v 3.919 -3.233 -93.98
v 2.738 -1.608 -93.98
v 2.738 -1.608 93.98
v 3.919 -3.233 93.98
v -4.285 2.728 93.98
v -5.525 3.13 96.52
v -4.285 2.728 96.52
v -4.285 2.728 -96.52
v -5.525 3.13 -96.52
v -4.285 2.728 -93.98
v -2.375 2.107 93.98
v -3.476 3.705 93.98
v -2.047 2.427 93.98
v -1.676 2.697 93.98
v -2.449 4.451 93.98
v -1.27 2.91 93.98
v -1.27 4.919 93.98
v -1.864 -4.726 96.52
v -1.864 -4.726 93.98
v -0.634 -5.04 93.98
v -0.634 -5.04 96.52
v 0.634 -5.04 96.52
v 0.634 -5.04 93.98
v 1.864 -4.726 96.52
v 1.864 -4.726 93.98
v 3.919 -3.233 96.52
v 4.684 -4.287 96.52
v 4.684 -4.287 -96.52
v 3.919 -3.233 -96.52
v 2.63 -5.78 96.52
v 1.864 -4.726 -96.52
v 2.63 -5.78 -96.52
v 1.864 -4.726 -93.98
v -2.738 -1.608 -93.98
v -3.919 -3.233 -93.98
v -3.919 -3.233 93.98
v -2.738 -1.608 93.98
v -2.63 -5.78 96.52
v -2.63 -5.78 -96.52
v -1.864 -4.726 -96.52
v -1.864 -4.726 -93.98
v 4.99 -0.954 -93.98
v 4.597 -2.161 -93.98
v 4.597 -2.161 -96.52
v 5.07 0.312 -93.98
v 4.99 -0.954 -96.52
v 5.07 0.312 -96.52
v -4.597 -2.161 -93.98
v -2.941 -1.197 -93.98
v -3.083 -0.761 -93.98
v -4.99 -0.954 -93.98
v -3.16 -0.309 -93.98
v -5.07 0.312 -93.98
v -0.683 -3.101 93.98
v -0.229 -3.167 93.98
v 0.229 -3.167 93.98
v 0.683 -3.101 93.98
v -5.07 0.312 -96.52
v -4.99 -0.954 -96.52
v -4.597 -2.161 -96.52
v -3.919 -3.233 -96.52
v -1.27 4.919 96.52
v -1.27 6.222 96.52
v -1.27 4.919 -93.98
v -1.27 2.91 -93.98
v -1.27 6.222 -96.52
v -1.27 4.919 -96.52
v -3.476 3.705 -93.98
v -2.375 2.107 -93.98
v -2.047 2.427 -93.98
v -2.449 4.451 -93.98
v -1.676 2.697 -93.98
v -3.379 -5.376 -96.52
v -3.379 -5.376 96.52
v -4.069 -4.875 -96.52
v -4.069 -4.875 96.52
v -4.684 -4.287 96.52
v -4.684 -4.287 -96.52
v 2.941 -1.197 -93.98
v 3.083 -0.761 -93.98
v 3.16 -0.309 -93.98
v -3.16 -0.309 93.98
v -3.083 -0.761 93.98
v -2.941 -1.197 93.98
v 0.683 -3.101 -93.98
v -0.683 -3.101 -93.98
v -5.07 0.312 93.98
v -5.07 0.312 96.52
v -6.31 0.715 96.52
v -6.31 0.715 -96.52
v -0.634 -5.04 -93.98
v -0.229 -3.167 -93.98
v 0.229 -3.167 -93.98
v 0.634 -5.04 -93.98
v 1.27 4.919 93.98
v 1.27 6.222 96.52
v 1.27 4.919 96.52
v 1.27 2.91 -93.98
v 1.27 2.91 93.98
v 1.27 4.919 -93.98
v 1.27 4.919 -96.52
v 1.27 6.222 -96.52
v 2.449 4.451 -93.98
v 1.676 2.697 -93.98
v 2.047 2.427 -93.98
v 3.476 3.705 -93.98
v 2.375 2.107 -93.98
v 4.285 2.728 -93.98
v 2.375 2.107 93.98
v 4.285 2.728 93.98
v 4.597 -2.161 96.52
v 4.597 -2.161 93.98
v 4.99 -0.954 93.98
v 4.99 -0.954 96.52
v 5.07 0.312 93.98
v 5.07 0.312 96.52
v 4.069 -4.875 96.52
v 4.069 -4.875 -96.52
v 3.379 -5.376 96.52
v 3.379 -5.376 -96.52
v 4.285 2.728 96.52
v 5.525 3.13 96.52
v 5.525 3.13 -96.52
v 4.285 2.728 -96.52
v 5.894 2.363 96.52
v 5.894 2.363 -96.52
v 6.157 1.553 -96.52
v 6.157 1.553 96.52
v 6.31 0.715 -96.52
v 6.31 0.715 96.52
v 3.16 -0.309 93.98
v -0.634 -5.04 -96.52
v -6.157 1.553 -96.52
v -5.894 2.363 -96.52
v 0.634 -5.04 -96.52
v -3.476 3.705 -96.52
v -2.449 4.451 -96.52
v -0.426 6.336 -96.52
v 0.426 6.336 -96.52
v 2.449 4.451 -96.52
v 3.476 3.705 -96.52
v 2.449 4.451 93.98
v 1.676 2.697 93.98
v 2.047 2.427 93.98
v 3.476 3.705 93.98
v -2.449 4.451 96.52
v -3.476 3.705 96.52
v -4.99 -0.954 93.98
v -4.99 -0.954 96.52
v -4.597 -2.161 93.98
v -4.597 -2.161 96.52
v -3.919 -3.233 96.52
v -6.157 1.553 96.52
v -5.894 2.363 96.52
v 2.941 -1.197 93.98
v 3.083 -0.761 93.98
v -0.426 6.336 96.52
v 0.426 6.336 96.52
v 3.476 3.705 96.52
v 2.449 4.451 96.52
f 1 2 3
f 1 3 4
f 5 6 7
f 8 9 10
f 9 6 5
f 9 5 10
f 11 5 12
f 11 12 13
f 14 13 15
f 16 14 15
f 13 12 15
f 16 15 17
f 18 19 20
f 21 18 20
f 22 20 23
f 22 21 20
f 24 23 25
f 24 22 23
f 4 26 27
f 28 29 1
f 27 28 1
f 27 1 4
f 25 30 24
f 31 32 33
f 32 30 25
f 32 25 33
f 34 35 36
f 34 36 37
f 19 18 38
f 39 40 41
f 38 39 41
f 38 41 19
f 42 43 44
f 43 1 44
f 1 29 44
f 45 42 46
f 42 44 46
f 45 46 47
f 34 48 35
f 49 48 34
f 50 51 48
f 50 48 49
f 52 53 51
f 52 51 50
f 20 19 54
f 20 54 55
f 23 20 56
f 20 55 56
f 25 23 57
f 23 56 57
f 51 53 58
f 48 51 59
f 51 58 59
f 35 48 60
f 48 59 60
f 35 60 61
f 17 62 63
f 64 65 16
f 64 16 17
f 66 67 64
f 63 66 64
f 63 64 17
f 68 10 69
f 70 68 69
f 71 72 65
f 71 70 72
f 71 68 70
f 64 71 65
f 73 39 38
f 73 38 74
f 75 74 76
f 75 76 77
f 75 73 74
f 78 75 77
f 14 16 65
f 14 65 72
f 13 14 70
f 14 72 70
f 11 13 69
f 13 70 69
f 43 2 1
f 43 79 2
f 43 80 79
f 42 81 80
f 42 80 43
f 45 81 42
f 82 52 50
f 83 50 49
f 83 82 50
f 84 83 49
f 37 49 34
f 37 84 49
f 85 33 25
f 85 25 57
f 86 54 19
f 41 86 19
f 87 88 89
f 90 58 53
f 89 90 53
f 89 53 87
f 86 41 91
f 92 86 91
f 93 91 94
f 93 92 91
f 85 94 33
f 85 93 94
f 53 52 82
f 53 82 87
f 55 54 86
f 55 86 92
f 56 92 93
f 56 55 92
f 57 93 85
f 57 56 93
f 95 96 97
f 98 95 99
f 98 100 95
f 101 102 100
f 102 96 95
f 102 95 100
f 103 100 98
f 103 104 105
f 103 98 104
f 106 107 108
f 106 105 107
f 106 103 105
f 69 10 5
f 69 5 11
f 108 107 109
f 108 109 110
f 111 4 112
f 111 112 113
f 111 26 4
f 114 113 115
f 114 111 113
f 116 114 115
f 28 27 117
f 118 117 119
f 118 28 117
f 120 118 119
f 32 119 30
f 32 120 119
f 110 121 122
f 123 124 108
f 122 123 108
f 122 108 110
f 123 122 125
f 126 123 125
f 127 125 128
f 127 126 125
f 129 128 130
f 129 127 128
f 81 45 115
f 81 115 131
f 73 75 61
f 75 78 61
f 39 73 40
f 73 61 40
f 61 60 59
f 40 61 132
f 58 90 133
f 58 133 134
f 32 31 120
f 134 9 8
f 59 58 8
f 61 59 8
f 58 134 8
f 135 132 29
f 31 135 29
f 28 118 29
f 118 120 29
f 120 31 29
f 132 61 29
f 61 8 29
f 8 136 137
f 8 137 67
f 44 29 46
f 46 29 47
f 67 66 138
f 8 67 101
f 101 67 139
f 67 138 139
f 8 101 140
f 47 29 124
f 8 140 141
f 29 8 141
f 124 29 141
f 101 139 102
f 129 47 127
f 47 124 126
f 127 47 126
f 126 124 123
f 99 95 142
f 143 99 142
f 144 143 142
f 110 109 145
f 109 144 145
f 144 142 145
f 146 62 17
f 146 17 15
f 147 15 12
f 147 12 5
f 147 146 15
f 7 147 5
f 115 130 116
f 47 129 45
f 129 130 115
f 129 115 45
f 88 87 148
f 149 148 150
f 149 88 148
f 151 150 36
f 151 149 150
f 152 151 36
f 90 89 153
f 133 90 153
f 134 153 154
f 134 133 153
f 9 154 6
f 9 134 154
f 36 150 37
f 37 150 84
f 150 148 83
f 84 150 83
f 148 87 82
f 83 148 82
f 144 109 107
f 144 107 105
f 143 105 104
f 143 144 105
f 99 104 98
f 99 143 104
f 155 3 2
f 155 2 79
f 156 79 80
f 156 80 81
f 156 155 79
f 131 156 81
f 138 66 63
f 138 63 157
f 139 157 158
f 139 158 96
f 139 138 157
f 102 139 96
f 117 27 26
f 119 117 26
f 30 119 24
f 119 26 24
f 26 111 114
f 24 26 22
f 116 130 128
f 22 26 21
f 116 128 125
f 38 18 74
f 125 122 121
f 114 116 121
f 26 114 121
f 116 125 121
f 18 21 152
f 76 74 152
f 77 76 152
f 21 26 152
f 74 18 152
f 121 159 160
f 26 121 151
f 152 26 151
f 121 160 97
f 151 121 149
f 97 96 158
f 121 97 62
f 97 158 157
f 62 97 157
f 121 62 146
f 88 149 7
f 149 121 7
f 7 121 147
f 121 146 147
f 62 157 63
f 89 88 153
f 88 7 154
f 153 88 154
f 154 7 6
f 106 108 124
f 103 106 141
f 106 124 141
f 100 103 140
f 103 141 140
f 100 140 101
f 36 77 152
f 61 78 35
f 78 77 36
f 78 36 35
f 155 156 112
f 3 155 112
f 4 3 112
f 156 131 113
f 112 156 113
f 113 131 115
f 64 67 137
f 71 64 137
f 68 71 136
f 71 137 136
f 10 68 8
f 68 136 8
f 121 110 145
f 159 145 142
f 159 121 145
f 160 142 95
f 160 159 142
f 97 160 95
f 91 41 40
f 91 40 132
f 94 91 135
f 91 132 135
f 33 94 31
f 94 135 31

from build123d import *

# Parameters (mm, degrees)
SKETCH1_R           = 3.175
BOSS_EXTRUDE1_DEPTH = 96.52
SKETCH2_R           = 5.08
BOSS_EXTRUDE2_DEPTH = 2.54
BOSS_EXTRUDE3_DEPTH = 193.04


with BuildPart() as part:
    # Sketch1 → Boss-Extrude1 (new body)
    with BuildSketch(Plane.XY):
        Circle(SKETCH1_R)
    boss_extrude1 = extrude(amount=BOSS_EXTRUDE1_DEPTH)

    # Sketch2 → Boss-Extrude2 (add)
    with BuildSketch(Plane.XY.offset(96.52)):
        Circle(SKETCH2_R)
    boss_extrude2 = extrude(amount=-BOSS_EXTRUDE2_DEPTH)

    # Mirror1: Boss-Extrude1, Boss-Extrude2 across plane
    add(boss_extrude1.mirror(Plane.XY))
    add(boss_extrude2.mirror(Plane.XY))

    # Sketch3 → Boss-Extrude3 (add, through all)
    with BuildSketch(Plane(origin=(0, 0, -96.52), x_dir=(-1, 0, 0), z_dir=(0, 0, -1))):
        with BuildLine():
            Line((-1.27, 4.91868885), (-1.27, 2.199704526))
            Line((-1.27, 2.199704526), (1.27, 2.199704526))
            Line((1.27, 2.199704526), (1.27, 4.91868885))
            Line((1.27, 4.91868885), (1.27, 6.221703947))
            ThreePointArc((1.27, 6.221703947), (0, 6.35), (-1.27, 6.221703947))
            Line((-1.27, 6.221703947), (-1.27, 4.91868885))
        make_face()
        with BuildLine():
            Line((1.69959174, 1.887587857), (2.484494906, -0.528095695))
            Line((2.484494906, -0.528095695), (5.070402665, 0.312116669))
            Line((5.070402665, 0.312116669), (6.309643664, 0.714770478))
            ThreePointArc((6.309643664, 0.714770478), (6.039208878, 1.962257914), (5.524740498, 3.130454029))
            Line((5.524740498, 3.130454029), (4.285499499, 2.72780022))
            Line((4.285499499, 2.72780022), (1.69959174, 1.887587857))
        make_face()
        with BuildLine():
            Line((2.320405462, -1.033111073), (0.265502297, -2.526085614))
            Line((0.265502297, -2.526085614), (1.863681184, -4.72579014))
            Line((1.863681184, -4.72579014), (2.629574241, -5.779951497))
            ThreePointArc((2.629574241, -5.779951497), (3.732436352, -5.137257914), (4.684477407, -4.286976956))
            Line((4.684477407, -4.286976956), (3.918584349, -3.232815599))
            Line((3.918584349, -3.232815599), (2.320405462, -1.033111073))
        make_face()
        with BuildLine():
            Line((-0.265502297, -2.526085614), (-2.320405462, -1.033111073))
            Line((-2.320405462, -1.033111073), (-3.918584349, -3.232815599))
            Line((-3.918584349, -3.232815599), (-4.684477407, -4.286976956))
            ThreePointArc((-4.684477407, -4.286976956), (-3.732436352, -5.137257914), (-2.629574241, -5.779951497))
            Line((-2.629574241, -5.779951497), (-1.863681184, -4.72579014))
            Line((-1.863681184, -4.72579014), (-0.265502297, -2.526085614))
        make_face()
        with BuildLine():
            Line((-2.484494906, -0.528095695), (-1.69959174, 1.887587857))
            Line((-1.69959174, 1.887587857), (-4.285499499, 2.72780022))
            Line((-4.285499499, 2.72780022), (-5.524740498, 3.130454029))
            ThreePointArc((-5.524740498, 3.130454029), (-6.039208878, 1.962257914), (-6.309643664, 0.714770478))
            Line((-6.309643664, 0.714770478), (-5.070402665, 0.312116669))
            Line((-5.070402665, 0.312116669), (-2.484494906, -0.528095695))
        make_face()
    extrude(amount=-BOSS_EXTRUDE3_DEPTH)


solid = part.part
